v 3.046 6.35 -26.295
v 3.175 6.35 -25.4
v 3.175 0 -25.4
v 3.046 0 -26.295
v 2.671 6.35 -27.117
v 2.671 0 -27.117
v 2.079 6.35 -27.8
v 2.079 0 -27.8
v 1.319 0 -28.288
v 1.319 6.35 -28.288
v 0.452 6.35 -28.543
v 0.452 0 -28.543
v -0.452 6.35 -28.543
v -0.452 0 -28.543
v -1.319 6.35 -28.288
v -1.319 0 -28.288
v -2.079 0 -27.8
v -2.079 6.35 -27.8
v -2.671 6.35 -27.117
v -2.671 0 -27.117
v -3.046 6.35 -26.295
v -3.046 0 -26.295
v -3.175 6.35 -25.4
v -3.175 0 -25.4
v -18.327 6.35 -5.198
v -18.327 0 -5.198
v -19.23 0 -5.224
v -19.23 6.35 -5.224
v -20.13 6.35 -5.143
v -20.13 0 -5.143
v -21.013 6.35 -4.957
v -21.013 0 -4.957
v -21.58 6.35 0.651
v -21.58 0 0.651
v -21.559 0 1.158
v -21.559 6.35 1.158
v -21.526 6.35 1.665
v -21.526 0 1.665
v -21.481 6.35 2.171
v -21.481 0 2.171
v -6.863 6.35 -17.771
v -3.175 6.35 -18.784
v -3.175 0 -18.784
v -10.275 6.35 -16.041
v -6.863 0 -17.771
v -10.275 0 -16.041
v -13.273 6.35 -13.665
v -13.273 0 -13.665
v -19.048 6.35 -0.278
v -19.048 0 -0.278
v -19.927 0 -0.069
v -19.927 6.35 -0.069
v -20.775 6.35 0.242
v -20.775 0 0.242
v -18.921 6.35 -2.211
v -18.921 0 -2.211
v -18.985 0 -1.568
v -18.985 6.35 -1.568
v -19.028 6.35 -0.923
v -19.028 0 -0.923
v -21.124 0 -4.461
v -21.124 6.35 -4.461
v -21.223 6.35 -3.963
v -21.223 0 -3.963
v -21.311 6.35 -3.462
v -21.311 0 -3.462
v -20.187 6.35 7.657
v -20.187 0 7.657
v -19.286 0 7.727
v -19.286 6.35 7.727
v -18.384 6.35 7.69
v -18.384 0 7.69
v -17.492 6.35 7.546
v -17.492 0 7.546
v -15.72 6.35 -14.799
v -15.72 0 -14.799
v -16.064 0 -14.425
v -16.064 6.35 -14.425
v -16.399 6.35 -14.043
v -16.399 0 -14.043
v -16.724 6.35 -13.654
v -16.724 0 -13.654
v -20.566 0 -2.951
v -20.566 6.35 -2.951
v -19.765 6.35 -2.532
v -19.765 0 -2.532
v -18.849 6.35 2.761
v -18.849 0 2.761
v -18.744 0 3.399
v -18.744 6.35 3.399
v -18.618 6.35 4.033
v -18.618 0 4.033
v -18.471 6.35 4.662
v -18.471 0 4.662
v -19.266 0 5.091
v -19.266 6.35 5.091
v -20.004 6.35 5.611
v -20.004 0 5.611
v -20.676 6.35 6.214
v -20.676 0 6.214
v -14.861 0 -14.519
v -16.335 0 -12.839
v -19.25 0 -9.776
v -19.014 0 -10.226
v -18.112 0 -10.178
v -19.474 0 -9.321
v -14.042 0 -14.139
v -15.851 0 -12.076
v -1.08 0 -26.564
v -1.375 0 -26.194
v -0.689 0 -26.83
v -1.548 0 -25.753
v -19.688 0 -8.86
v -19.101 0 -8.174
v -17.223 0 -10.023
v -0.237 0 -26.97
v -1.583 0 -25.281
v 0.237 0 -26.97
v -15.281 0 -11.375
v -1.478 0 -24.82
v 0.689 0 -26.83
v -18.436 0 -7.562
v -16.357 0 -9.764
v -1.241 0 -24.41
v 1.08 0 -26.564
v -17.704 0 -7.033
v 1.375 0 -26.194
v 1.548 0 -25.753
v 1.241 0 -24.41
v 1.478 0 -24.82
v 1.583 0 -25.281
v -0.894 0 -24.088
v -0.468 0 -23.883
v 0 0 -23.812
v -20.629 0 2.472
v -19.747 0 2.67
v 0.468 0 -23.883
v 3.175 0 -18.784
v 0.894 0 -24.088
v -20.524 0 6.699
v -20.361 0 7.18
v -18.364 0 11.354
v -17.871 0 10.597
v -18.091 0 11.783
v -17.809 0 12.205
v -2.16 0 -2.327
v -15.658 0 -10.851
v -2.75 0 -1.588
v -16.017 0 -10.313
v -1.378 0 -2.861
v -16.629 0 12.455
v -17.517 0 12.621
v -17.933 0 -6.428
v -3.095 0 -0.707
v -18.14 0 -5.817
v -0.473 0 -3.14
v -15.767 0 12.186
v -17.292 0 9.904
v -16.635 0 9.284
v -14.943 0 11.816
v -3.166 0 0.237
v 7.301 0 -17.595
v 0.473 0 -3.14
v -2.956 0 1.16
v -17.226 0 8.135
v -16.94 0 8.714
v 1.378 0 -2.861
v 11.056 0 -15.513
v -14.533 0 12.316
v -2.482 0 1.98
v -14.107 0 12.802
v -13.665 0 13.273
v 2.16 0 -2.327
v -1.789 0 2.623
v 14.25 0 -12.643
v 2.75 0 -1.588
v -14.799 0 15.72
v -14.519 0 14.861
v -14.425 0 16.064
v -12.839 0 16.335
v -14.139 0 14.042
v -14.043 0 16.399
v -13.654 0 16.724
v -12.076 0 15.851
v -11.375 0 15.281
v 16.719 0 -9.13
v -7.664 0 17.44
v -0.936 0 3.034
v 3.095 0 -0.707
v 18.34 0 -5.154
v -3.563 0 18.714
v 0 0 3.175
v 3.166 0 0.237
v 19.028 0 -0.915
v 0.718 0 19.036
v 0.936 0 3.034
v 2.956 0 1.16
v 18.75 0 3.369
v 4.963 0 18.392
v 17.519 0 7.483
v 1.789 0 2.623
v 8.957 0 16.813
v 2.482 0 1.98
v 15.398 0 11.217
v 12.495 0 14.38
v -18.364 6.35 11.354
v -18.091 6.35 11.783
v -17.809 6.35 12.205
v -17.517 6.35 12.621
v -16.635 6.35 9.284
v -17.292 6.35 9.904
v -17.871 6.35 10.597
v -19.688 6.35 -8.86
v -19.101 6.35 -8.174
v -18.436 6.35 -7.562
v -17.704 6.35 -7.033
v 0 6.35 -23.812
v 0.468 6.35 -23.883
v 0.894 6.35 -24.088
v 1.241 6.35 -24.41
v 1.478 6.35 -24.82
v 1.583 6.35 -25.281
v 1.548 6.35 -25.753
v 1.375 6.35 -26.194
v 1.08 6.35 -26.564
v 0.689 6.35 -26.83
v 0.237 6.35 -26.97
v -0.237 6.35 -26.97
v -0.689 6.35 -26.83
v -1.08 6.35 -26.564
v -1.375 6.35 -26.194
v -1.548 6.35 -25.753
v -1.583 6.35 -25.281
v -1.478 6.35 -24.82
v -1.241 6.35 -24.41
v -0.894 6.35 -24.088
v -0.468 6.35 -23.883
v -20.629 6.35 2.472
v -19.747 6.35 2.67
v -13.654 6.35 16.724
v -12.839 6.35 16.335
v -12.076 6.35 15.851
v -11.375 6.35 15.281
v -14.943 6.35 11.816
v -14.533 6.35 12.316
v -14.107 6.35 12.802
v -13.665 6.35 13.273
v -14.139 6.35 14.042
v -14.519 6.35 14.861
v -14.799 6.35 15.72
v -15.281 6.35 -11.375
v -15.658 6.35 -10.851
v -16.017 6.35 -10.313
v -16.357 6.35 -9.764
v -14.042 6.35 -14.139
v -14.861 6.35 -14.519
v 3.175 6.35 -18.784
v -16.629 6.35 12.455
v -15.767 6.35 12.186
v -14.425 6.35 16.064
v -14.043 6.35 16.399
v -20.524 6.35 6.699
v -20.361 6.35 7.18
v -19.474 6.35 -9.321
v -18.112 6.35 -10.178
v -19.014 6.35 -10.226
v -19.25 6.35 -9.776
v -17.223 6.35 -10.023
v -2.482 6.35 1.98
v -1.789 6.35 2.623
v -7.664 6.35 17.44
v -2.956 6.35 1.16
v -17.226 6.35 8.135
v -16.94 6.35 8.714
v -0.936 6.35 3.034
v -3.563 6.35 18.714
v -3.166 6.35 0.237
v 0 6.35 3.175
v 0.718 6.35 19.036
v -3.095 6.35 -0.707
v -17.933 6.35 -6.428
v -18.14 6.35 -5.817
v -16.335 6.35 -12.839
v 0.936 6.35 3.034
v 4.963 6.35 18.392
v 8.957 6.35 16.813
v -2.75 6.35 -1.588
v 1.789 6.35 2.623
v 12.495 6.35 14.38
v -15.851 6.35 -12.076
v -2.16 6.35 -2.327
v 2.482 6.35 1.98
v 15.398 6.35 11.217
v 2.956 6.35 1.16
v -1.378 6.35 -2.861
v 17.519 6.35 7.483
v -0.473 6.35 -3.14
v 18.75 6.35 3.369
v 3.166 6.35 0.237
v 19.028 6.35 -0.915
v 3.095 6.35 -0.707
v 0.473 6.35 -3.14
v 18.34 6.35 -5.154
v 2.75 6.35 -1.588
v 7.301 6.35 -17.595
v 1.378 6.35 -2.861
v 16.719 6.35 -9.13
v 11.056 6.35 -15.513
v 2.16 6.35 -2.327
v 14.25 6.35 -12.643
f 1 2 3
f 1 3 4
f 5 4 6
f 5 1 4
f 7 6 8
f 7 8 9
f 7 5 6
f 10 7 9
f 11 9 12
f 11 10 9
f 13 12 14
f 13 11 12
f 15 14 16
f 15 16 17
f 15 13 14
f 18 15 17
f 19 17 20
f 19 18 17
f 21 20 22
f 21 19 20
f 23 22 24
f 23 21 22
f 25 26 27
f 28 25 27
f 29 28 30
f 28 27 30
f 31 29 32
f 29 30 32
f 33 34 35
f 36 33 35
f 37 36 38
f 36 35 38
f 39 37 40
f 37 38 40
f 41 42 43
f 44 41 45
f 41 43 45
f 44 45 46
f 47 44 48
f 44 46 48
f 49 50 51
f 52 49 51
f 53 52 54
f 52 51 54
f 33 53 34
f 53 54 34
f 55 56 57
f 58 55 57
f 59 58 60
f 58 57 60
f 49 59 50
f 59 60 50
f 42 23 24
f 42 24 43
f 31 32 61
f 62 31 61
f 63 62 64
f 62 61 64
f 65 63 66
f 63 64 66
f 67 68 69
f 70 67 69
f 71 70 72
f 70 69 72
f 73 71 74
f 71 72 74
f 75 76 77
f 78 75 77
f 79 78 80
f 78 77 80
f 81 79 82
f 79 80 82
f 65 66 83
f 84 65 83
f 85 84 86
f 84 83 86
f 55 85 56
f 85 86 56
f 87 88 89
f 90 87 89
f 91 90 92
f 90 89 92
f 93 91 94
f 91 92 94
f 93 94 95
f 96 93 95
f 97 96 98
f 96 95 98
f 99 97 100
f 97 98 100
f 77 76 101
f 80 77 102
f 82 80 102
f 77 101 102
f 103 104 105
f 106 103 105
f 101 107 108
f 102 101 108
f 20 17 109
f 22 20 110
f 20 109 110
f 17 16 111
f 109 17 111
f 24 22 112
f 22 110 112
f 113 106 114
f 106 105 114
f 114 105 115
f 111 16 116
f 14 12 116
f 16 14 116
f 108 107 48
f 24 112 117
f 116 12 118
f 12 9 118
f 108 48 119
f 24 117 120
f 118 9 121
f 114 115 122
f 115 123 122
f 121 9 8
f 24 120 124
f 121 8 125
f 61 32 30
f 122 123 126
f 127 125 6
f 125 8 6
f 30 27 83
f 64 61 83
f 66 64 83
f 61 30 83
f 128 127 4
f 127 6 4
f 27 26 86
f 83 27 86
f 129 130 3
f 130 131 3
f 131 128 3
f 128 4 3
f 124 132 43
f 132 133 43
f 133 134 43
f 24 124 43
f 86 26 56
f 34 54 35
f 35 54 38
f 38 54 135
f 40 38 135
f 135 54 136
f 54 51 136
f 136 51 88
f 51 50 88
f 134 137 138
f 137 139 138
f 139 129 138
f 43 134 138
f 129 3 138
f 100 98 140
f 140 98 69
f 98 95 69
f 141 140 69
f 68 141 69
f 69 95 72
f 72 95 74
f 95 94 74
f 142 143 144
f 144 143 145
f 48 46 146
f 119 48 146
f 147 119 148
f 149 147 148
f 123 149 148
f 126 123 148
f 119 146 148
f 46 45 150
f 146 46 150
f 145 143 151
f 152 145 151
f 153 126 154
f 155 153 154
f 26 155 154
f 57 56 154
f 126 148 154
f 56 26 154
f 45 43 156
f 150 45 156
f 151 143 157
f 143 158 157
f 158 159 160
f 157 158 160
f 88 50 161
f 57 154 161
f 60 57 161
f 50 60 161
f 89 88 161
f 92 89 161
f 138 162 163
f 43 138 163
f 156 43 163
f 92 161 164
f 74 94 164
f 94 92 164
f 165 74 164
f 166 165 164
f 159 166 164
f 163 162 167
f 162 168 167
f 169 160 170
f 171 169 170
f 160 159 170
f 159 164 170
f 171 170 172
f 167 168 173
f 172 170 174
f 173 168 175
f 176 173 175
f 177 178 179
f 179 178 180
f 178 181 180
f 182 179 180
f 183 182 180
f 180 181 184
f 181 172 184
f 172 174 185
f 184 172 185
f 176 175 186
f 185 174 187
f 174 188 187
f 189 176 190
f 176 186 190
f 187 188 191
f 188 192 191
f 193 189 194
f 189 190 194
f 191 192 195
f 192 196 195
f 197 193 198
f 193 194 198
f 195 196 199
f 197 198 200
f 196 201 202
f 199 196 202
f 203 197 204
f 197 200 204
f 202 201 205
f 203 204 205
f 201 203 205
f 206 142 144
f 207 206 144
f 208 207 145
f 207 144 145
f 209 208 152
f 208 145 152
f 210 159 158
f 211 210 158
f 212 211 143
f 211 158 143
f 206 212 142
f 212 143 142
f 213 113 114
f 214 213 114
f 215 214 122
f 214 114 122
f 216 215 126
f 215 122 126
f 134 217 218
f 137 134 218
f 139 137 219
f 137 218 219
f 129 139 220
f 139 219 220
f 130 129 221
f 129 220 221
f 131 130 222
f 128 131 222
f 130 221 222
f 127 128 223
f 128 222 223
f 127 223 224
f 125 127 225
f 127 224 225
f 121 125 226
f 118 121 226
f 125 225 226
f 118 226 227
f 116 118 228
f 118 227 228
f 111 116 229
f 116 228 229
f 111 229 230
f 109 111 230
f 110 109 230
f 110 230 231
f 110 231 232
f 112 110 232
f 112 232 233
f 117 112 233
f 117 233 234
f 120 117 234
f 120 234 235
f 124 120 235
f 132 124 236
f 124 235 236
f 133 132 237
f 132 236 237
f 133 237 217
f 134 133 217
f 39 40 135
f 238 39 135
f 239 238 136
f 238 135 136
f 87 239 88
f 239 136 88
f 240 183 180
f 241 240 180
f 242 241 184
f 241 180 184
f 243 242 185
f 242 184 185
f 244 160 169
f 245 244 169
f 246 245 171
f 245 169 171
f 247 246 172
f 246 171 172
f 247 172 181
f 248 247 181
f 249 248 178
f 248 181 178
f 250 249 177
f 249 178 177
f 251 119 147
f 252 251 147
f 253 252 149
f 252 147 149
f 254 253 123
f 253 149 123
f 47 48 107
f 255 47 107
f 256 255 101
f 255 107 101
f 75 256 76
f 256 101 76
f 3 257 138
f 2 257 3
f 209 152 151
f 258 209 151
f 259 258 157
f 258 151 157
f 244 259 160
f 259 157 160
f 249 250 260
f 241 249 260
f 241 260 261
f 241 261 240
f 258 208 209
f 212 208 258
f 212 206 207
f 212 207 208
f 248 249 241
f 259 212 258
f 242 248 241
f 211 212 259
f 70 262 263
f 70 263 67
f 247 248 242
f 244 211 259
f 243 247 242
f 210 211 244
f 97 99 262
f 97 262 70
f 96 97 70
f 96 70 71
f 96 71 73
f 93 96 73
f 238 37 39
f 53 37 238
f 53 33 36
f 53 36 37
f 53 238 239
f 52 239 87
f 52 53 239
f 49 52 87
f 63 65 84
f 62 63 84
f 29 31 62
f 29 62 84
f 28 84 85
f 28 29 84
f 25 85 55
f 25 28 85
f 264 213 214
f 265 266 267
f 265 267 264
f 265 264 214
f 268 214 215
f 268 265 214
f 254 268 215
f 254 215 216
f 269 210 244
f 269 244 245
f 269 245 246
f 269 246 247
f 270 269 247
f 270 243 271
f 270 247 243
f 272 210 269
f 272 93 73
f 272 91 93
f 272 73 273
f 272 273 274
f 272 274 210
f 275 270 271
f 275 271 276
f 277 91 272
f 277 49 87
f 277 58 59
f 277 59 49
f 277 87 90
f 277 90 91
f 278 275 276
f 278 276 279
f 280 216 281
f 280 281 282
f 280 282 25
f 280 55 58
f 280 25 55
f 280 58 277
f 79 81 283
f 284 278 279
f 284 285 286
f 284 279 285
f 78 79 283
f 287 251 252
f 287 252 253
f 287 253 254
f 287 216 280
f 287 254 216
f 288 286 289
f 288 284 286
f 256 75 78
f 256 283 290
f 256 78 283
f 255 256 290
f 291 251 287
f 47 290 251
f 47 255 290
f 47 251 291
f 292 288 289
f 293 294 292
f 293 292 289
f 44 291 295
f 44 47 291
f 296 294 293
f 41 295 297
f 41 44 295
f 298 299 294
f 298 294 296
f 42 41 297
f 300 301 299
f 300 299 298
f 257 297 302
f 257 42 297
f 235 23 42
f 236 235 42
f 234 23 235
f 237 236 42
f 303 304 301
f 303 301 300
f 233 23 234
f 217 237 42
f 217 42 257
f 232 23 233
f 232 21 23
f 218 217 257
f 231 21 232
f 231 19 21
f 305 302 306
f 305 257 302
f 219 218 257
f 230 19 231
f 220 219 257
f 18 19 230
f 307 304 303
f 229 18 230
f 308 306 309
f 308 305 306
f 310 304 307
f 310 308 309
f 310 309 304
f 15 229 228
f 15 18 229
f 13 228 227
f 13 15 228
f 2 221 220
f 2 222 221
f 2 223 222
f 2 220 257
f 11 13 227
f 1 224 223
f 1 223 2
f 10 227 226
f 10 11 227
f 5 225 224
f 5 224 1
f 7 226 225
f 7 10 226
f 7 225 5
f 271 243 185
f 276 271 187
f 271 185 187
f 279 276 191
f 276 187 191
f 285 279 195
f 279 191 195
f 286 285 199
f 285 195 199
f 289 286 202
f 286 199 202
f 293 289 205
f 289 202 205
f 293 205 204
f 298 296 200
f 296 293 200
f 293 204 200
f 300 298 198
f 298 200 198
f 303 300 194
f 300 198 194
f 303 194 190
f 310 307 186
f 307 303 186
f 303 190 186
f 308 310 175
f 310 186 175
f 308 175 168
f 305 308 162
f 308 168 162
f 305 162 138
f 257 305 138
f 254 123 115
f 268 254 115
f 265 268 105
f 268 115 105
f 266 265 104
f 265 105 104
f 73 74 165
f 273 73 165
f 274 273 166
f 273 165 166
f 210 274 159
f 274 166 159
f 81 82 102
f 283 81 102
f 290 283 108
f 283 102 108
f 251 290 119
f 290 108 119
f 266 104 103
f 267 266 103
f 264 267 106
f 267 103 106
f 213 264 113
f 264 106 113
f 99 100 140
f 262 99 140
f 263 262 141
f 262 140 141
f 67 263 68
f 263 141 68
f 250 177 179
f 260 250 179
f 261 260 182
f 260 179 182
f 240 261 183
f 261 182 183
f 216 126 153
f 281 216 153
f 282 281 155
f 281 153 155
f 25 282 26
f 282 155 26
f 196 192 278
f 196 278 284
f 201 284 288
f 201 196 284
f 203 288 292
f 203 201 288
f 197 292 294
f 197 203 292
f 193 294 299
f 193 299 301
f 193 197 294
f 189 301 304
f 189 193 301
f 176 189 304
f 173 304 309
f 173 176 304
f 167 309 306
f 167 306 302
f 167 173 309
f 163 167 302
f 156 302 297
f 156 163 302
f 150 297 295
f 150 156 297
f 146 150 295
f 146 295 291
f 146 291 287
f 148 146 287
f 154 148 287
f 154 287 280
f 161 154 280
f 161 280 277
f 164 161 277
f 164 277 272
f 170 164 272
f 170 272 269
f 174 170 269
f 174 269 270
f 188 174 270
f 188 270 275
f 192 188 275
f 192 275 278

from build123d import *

# Parameters (mm, degrees)
SKETCH1_R           = 19.05
SKETCH1_R_2         = 3.175
BOSS_EXTRUDE1_DEPTH = 6.35
BOSS_EXTRUDE3_DEPTH = 6.35
CIRPATTERN2_DEPTH   = 6.35
SKETCH4_R           = 1.5875
BOSS_EXTRUDE4_DEPTH = 6.35


# Read off the part's stored shape, not the designer's step: CirPattern2
with BuildPart() as part:
    # Sketch1 → Boss-Extrude1 (new body)
    with BuildSketch(Plane(origin=(0, 0, 0), x_dir=(1, 0, 0), z_dir=(0, 1, 0))):
        with Locations(Location((0, 0, 0), (0, 0, 270))):
            Circle(SKETCH1_R)
        with Locations(Location((0, 0, 0), (0, 0, 270))):
            Circle(SKETCH1_R_2, mode=Mode.SUBTRACT)
    extrude(amount=BOSS_EXTRUDE1_DEPTH)

    # Sketch3 → Boss-Extrude3 (add)
    with BuildSketch(Plane(origin=(0, 0, 0), x_dir=(1, 0, 0), z_dir=(0, 1, 0))):
        with BuildLine():
            ThreePointArc((-18.32709122, 5.198098444), (-19.680979383, 5.197152008), (-21.013329851, 4.956618665))
            ThreePointArc((-21.013329851, 4.956618665), (-21.175154204, 4.212000052), (-21.310601203, 3.462134657))
            ThreePointArc((-21.310601203, 3.462134657), (-20.171718001, 2.730042376), (-18.921250622, 2.211057413))
            ThreePointArc((-18.921250622, 2.211057413), (-18.683959592, 3.716470634), (-18.32709122, 5.198098444))
        make_face()
    extrude(amount=BOSS_EXTRUDE3_DEPTH)

    # CirPattern2 outline → CirPattern2 (add)
    with BuildSketch(Plane(origin=(0, 0, 0), x_dir=(1, 0, 0), z_dir=(0, 1, 0))):
        with BuildLine():
            ThreePointArc((-17.704260875, 7.032897477), (-17.085425728, 8.425599549), (-16.357243856, 9.764377784))
            ThreePointArc((-16.357243856, 9.764377784), (-17.665244353, 10.113875638), (-19.014450689, 10.226375946))
            ThreePointArc((-19.014450689, 10.226375946), (-19.36348249, 9.549012822), (-19.688393689, 8.859754733))
            ThreePointArc((-19.688393689, 8.859754733), (-18.777796417, 7.857843228), (-17.704260875, 7.032897477))
        make_face()
        with BuildLine():
            ThreePointArc((-15.280755006, 11.375457202), (-14.322548335, 12.560537779), (-13.272677354, 13.665230916))
            ThreePointArc((-13.272677354, 13.665230916), (-14.445652113, 14.341355358), (-15.719768136, 14.799222606))
            ThreePointArc((-15.719768136, 14.799222606), (-16.232221443, 14.235276148), (-16.724454683, 13.653597166))
            ThreePointArc((-16.724454683, 13.653597166), (-16.104199039, 12.450145051), (-15.280755006, 11.375457202))
        make_face()
        with BuildLine():
            ThreePointArc((-11.375457197, -15.280755), (-12.560537774, -14.322548329), (-13.66523091, -13.272677349))
            ThreePointArc((-13.66523091, -13.272677349), (-14.341355358, -14.445652113), (-14.799222606, -15.719768136))
            ThreePointArc((-14.799222606, -15.719768136), (-14.235276148, -16.232221443), (-13.653597166, -16.724454683))
            ThreePointArc((-13.653597166, -16.724454683), (-12.450145051, -16.104199039), (-11.375457197, -15.280755))
        make_face()
        with BuildLine():
            ThreePointArc((-14.942798311, -11.81589093), (-15.839496111, -10.583612937), (-16.634821136, -9.28359982))
            ThreePointArc((-16.634821136, -9.28359982), (-17.59149541, -10.241612555), (-18.363526703, -11.353809363))
            ThreePointArc((-18.363526703, -11.353809363), (-17.95142893, -11.994761331), (-17.516969515, -12.620771728))
            ThreePointArc((-17.516969515, -12.620771728), (-16.193990063, -12.33312711), (-14.942798311, -11.81589093))
        make_face()
        with BuildLine():
            ThreePointArc((-17.491812414, -7.545793421), (-18.039018964, -6.123421813), (-18.470775793, -4.661860306))
            ThreePointArc((-18.470775793, -4.661860306), (-19.642804121, -5.339624026), (-20.676386801, -6.214107244))
            ThreePointArc((-20.676386801, -6.214107244), (-20.444221496, -6.939878056), (-20.18658934, -7.657004037))
            ThreePointArc((-20.18658934, -7.657004037), (-18.834241415, -7.72157295), (-17.491812414, -7.545793421))
        make_face()
        with BuildLine():
            ThreePointArc((-21.580185309, -0.650923987), (-21.543774153, -1.41205356), (-21.480526461, -2.171424174))
            ThreePointArc((-21.480526461, -2.171424174), (-20.190970338, -2.583806354), (-18.84878841, -2.761462559))
            ThreePointArc((-18.84878841, -2.761462559), (-19.009212486, -1.245929612), (-19.047977604, 0.277577285))
            ThreePointArc((-19.047977604, 0.277577285), (-20.355488193, -0.073748943), (-21.580185309, -0.650923987))
        make_face()
    extrude(amount=CIRPATTERN2_DEPTH)

    # Sketch4 → Boss-Extrude4 (add)
    with BuildSketch(Plane(origin=(0, 6.35, 0), x_dir=(1, 0, 0), z_dir=(0, 1, 0))):
        with BuildLine():
            Line((-3.175, 3.175), (3.175, 3.175))
            Line((3.175, 3.175), (3.175, 25.399999902))
            ThreePointArc((3.175, 25.399999902), (0, 28.575), (-3.175, 25.399999902))
            Line((-3.175, 25.399999902), (-3.175, 3.175))
        make_face()
        with Locations(Location((0, 25.4, 0), (0, 0, 270))):
            Circle(SKETCH4_R, mode=Mode.SUBTRACT)
    extrude(amount=-BOSS_EXTRUDE4_DEPTH)


solid = part.part
